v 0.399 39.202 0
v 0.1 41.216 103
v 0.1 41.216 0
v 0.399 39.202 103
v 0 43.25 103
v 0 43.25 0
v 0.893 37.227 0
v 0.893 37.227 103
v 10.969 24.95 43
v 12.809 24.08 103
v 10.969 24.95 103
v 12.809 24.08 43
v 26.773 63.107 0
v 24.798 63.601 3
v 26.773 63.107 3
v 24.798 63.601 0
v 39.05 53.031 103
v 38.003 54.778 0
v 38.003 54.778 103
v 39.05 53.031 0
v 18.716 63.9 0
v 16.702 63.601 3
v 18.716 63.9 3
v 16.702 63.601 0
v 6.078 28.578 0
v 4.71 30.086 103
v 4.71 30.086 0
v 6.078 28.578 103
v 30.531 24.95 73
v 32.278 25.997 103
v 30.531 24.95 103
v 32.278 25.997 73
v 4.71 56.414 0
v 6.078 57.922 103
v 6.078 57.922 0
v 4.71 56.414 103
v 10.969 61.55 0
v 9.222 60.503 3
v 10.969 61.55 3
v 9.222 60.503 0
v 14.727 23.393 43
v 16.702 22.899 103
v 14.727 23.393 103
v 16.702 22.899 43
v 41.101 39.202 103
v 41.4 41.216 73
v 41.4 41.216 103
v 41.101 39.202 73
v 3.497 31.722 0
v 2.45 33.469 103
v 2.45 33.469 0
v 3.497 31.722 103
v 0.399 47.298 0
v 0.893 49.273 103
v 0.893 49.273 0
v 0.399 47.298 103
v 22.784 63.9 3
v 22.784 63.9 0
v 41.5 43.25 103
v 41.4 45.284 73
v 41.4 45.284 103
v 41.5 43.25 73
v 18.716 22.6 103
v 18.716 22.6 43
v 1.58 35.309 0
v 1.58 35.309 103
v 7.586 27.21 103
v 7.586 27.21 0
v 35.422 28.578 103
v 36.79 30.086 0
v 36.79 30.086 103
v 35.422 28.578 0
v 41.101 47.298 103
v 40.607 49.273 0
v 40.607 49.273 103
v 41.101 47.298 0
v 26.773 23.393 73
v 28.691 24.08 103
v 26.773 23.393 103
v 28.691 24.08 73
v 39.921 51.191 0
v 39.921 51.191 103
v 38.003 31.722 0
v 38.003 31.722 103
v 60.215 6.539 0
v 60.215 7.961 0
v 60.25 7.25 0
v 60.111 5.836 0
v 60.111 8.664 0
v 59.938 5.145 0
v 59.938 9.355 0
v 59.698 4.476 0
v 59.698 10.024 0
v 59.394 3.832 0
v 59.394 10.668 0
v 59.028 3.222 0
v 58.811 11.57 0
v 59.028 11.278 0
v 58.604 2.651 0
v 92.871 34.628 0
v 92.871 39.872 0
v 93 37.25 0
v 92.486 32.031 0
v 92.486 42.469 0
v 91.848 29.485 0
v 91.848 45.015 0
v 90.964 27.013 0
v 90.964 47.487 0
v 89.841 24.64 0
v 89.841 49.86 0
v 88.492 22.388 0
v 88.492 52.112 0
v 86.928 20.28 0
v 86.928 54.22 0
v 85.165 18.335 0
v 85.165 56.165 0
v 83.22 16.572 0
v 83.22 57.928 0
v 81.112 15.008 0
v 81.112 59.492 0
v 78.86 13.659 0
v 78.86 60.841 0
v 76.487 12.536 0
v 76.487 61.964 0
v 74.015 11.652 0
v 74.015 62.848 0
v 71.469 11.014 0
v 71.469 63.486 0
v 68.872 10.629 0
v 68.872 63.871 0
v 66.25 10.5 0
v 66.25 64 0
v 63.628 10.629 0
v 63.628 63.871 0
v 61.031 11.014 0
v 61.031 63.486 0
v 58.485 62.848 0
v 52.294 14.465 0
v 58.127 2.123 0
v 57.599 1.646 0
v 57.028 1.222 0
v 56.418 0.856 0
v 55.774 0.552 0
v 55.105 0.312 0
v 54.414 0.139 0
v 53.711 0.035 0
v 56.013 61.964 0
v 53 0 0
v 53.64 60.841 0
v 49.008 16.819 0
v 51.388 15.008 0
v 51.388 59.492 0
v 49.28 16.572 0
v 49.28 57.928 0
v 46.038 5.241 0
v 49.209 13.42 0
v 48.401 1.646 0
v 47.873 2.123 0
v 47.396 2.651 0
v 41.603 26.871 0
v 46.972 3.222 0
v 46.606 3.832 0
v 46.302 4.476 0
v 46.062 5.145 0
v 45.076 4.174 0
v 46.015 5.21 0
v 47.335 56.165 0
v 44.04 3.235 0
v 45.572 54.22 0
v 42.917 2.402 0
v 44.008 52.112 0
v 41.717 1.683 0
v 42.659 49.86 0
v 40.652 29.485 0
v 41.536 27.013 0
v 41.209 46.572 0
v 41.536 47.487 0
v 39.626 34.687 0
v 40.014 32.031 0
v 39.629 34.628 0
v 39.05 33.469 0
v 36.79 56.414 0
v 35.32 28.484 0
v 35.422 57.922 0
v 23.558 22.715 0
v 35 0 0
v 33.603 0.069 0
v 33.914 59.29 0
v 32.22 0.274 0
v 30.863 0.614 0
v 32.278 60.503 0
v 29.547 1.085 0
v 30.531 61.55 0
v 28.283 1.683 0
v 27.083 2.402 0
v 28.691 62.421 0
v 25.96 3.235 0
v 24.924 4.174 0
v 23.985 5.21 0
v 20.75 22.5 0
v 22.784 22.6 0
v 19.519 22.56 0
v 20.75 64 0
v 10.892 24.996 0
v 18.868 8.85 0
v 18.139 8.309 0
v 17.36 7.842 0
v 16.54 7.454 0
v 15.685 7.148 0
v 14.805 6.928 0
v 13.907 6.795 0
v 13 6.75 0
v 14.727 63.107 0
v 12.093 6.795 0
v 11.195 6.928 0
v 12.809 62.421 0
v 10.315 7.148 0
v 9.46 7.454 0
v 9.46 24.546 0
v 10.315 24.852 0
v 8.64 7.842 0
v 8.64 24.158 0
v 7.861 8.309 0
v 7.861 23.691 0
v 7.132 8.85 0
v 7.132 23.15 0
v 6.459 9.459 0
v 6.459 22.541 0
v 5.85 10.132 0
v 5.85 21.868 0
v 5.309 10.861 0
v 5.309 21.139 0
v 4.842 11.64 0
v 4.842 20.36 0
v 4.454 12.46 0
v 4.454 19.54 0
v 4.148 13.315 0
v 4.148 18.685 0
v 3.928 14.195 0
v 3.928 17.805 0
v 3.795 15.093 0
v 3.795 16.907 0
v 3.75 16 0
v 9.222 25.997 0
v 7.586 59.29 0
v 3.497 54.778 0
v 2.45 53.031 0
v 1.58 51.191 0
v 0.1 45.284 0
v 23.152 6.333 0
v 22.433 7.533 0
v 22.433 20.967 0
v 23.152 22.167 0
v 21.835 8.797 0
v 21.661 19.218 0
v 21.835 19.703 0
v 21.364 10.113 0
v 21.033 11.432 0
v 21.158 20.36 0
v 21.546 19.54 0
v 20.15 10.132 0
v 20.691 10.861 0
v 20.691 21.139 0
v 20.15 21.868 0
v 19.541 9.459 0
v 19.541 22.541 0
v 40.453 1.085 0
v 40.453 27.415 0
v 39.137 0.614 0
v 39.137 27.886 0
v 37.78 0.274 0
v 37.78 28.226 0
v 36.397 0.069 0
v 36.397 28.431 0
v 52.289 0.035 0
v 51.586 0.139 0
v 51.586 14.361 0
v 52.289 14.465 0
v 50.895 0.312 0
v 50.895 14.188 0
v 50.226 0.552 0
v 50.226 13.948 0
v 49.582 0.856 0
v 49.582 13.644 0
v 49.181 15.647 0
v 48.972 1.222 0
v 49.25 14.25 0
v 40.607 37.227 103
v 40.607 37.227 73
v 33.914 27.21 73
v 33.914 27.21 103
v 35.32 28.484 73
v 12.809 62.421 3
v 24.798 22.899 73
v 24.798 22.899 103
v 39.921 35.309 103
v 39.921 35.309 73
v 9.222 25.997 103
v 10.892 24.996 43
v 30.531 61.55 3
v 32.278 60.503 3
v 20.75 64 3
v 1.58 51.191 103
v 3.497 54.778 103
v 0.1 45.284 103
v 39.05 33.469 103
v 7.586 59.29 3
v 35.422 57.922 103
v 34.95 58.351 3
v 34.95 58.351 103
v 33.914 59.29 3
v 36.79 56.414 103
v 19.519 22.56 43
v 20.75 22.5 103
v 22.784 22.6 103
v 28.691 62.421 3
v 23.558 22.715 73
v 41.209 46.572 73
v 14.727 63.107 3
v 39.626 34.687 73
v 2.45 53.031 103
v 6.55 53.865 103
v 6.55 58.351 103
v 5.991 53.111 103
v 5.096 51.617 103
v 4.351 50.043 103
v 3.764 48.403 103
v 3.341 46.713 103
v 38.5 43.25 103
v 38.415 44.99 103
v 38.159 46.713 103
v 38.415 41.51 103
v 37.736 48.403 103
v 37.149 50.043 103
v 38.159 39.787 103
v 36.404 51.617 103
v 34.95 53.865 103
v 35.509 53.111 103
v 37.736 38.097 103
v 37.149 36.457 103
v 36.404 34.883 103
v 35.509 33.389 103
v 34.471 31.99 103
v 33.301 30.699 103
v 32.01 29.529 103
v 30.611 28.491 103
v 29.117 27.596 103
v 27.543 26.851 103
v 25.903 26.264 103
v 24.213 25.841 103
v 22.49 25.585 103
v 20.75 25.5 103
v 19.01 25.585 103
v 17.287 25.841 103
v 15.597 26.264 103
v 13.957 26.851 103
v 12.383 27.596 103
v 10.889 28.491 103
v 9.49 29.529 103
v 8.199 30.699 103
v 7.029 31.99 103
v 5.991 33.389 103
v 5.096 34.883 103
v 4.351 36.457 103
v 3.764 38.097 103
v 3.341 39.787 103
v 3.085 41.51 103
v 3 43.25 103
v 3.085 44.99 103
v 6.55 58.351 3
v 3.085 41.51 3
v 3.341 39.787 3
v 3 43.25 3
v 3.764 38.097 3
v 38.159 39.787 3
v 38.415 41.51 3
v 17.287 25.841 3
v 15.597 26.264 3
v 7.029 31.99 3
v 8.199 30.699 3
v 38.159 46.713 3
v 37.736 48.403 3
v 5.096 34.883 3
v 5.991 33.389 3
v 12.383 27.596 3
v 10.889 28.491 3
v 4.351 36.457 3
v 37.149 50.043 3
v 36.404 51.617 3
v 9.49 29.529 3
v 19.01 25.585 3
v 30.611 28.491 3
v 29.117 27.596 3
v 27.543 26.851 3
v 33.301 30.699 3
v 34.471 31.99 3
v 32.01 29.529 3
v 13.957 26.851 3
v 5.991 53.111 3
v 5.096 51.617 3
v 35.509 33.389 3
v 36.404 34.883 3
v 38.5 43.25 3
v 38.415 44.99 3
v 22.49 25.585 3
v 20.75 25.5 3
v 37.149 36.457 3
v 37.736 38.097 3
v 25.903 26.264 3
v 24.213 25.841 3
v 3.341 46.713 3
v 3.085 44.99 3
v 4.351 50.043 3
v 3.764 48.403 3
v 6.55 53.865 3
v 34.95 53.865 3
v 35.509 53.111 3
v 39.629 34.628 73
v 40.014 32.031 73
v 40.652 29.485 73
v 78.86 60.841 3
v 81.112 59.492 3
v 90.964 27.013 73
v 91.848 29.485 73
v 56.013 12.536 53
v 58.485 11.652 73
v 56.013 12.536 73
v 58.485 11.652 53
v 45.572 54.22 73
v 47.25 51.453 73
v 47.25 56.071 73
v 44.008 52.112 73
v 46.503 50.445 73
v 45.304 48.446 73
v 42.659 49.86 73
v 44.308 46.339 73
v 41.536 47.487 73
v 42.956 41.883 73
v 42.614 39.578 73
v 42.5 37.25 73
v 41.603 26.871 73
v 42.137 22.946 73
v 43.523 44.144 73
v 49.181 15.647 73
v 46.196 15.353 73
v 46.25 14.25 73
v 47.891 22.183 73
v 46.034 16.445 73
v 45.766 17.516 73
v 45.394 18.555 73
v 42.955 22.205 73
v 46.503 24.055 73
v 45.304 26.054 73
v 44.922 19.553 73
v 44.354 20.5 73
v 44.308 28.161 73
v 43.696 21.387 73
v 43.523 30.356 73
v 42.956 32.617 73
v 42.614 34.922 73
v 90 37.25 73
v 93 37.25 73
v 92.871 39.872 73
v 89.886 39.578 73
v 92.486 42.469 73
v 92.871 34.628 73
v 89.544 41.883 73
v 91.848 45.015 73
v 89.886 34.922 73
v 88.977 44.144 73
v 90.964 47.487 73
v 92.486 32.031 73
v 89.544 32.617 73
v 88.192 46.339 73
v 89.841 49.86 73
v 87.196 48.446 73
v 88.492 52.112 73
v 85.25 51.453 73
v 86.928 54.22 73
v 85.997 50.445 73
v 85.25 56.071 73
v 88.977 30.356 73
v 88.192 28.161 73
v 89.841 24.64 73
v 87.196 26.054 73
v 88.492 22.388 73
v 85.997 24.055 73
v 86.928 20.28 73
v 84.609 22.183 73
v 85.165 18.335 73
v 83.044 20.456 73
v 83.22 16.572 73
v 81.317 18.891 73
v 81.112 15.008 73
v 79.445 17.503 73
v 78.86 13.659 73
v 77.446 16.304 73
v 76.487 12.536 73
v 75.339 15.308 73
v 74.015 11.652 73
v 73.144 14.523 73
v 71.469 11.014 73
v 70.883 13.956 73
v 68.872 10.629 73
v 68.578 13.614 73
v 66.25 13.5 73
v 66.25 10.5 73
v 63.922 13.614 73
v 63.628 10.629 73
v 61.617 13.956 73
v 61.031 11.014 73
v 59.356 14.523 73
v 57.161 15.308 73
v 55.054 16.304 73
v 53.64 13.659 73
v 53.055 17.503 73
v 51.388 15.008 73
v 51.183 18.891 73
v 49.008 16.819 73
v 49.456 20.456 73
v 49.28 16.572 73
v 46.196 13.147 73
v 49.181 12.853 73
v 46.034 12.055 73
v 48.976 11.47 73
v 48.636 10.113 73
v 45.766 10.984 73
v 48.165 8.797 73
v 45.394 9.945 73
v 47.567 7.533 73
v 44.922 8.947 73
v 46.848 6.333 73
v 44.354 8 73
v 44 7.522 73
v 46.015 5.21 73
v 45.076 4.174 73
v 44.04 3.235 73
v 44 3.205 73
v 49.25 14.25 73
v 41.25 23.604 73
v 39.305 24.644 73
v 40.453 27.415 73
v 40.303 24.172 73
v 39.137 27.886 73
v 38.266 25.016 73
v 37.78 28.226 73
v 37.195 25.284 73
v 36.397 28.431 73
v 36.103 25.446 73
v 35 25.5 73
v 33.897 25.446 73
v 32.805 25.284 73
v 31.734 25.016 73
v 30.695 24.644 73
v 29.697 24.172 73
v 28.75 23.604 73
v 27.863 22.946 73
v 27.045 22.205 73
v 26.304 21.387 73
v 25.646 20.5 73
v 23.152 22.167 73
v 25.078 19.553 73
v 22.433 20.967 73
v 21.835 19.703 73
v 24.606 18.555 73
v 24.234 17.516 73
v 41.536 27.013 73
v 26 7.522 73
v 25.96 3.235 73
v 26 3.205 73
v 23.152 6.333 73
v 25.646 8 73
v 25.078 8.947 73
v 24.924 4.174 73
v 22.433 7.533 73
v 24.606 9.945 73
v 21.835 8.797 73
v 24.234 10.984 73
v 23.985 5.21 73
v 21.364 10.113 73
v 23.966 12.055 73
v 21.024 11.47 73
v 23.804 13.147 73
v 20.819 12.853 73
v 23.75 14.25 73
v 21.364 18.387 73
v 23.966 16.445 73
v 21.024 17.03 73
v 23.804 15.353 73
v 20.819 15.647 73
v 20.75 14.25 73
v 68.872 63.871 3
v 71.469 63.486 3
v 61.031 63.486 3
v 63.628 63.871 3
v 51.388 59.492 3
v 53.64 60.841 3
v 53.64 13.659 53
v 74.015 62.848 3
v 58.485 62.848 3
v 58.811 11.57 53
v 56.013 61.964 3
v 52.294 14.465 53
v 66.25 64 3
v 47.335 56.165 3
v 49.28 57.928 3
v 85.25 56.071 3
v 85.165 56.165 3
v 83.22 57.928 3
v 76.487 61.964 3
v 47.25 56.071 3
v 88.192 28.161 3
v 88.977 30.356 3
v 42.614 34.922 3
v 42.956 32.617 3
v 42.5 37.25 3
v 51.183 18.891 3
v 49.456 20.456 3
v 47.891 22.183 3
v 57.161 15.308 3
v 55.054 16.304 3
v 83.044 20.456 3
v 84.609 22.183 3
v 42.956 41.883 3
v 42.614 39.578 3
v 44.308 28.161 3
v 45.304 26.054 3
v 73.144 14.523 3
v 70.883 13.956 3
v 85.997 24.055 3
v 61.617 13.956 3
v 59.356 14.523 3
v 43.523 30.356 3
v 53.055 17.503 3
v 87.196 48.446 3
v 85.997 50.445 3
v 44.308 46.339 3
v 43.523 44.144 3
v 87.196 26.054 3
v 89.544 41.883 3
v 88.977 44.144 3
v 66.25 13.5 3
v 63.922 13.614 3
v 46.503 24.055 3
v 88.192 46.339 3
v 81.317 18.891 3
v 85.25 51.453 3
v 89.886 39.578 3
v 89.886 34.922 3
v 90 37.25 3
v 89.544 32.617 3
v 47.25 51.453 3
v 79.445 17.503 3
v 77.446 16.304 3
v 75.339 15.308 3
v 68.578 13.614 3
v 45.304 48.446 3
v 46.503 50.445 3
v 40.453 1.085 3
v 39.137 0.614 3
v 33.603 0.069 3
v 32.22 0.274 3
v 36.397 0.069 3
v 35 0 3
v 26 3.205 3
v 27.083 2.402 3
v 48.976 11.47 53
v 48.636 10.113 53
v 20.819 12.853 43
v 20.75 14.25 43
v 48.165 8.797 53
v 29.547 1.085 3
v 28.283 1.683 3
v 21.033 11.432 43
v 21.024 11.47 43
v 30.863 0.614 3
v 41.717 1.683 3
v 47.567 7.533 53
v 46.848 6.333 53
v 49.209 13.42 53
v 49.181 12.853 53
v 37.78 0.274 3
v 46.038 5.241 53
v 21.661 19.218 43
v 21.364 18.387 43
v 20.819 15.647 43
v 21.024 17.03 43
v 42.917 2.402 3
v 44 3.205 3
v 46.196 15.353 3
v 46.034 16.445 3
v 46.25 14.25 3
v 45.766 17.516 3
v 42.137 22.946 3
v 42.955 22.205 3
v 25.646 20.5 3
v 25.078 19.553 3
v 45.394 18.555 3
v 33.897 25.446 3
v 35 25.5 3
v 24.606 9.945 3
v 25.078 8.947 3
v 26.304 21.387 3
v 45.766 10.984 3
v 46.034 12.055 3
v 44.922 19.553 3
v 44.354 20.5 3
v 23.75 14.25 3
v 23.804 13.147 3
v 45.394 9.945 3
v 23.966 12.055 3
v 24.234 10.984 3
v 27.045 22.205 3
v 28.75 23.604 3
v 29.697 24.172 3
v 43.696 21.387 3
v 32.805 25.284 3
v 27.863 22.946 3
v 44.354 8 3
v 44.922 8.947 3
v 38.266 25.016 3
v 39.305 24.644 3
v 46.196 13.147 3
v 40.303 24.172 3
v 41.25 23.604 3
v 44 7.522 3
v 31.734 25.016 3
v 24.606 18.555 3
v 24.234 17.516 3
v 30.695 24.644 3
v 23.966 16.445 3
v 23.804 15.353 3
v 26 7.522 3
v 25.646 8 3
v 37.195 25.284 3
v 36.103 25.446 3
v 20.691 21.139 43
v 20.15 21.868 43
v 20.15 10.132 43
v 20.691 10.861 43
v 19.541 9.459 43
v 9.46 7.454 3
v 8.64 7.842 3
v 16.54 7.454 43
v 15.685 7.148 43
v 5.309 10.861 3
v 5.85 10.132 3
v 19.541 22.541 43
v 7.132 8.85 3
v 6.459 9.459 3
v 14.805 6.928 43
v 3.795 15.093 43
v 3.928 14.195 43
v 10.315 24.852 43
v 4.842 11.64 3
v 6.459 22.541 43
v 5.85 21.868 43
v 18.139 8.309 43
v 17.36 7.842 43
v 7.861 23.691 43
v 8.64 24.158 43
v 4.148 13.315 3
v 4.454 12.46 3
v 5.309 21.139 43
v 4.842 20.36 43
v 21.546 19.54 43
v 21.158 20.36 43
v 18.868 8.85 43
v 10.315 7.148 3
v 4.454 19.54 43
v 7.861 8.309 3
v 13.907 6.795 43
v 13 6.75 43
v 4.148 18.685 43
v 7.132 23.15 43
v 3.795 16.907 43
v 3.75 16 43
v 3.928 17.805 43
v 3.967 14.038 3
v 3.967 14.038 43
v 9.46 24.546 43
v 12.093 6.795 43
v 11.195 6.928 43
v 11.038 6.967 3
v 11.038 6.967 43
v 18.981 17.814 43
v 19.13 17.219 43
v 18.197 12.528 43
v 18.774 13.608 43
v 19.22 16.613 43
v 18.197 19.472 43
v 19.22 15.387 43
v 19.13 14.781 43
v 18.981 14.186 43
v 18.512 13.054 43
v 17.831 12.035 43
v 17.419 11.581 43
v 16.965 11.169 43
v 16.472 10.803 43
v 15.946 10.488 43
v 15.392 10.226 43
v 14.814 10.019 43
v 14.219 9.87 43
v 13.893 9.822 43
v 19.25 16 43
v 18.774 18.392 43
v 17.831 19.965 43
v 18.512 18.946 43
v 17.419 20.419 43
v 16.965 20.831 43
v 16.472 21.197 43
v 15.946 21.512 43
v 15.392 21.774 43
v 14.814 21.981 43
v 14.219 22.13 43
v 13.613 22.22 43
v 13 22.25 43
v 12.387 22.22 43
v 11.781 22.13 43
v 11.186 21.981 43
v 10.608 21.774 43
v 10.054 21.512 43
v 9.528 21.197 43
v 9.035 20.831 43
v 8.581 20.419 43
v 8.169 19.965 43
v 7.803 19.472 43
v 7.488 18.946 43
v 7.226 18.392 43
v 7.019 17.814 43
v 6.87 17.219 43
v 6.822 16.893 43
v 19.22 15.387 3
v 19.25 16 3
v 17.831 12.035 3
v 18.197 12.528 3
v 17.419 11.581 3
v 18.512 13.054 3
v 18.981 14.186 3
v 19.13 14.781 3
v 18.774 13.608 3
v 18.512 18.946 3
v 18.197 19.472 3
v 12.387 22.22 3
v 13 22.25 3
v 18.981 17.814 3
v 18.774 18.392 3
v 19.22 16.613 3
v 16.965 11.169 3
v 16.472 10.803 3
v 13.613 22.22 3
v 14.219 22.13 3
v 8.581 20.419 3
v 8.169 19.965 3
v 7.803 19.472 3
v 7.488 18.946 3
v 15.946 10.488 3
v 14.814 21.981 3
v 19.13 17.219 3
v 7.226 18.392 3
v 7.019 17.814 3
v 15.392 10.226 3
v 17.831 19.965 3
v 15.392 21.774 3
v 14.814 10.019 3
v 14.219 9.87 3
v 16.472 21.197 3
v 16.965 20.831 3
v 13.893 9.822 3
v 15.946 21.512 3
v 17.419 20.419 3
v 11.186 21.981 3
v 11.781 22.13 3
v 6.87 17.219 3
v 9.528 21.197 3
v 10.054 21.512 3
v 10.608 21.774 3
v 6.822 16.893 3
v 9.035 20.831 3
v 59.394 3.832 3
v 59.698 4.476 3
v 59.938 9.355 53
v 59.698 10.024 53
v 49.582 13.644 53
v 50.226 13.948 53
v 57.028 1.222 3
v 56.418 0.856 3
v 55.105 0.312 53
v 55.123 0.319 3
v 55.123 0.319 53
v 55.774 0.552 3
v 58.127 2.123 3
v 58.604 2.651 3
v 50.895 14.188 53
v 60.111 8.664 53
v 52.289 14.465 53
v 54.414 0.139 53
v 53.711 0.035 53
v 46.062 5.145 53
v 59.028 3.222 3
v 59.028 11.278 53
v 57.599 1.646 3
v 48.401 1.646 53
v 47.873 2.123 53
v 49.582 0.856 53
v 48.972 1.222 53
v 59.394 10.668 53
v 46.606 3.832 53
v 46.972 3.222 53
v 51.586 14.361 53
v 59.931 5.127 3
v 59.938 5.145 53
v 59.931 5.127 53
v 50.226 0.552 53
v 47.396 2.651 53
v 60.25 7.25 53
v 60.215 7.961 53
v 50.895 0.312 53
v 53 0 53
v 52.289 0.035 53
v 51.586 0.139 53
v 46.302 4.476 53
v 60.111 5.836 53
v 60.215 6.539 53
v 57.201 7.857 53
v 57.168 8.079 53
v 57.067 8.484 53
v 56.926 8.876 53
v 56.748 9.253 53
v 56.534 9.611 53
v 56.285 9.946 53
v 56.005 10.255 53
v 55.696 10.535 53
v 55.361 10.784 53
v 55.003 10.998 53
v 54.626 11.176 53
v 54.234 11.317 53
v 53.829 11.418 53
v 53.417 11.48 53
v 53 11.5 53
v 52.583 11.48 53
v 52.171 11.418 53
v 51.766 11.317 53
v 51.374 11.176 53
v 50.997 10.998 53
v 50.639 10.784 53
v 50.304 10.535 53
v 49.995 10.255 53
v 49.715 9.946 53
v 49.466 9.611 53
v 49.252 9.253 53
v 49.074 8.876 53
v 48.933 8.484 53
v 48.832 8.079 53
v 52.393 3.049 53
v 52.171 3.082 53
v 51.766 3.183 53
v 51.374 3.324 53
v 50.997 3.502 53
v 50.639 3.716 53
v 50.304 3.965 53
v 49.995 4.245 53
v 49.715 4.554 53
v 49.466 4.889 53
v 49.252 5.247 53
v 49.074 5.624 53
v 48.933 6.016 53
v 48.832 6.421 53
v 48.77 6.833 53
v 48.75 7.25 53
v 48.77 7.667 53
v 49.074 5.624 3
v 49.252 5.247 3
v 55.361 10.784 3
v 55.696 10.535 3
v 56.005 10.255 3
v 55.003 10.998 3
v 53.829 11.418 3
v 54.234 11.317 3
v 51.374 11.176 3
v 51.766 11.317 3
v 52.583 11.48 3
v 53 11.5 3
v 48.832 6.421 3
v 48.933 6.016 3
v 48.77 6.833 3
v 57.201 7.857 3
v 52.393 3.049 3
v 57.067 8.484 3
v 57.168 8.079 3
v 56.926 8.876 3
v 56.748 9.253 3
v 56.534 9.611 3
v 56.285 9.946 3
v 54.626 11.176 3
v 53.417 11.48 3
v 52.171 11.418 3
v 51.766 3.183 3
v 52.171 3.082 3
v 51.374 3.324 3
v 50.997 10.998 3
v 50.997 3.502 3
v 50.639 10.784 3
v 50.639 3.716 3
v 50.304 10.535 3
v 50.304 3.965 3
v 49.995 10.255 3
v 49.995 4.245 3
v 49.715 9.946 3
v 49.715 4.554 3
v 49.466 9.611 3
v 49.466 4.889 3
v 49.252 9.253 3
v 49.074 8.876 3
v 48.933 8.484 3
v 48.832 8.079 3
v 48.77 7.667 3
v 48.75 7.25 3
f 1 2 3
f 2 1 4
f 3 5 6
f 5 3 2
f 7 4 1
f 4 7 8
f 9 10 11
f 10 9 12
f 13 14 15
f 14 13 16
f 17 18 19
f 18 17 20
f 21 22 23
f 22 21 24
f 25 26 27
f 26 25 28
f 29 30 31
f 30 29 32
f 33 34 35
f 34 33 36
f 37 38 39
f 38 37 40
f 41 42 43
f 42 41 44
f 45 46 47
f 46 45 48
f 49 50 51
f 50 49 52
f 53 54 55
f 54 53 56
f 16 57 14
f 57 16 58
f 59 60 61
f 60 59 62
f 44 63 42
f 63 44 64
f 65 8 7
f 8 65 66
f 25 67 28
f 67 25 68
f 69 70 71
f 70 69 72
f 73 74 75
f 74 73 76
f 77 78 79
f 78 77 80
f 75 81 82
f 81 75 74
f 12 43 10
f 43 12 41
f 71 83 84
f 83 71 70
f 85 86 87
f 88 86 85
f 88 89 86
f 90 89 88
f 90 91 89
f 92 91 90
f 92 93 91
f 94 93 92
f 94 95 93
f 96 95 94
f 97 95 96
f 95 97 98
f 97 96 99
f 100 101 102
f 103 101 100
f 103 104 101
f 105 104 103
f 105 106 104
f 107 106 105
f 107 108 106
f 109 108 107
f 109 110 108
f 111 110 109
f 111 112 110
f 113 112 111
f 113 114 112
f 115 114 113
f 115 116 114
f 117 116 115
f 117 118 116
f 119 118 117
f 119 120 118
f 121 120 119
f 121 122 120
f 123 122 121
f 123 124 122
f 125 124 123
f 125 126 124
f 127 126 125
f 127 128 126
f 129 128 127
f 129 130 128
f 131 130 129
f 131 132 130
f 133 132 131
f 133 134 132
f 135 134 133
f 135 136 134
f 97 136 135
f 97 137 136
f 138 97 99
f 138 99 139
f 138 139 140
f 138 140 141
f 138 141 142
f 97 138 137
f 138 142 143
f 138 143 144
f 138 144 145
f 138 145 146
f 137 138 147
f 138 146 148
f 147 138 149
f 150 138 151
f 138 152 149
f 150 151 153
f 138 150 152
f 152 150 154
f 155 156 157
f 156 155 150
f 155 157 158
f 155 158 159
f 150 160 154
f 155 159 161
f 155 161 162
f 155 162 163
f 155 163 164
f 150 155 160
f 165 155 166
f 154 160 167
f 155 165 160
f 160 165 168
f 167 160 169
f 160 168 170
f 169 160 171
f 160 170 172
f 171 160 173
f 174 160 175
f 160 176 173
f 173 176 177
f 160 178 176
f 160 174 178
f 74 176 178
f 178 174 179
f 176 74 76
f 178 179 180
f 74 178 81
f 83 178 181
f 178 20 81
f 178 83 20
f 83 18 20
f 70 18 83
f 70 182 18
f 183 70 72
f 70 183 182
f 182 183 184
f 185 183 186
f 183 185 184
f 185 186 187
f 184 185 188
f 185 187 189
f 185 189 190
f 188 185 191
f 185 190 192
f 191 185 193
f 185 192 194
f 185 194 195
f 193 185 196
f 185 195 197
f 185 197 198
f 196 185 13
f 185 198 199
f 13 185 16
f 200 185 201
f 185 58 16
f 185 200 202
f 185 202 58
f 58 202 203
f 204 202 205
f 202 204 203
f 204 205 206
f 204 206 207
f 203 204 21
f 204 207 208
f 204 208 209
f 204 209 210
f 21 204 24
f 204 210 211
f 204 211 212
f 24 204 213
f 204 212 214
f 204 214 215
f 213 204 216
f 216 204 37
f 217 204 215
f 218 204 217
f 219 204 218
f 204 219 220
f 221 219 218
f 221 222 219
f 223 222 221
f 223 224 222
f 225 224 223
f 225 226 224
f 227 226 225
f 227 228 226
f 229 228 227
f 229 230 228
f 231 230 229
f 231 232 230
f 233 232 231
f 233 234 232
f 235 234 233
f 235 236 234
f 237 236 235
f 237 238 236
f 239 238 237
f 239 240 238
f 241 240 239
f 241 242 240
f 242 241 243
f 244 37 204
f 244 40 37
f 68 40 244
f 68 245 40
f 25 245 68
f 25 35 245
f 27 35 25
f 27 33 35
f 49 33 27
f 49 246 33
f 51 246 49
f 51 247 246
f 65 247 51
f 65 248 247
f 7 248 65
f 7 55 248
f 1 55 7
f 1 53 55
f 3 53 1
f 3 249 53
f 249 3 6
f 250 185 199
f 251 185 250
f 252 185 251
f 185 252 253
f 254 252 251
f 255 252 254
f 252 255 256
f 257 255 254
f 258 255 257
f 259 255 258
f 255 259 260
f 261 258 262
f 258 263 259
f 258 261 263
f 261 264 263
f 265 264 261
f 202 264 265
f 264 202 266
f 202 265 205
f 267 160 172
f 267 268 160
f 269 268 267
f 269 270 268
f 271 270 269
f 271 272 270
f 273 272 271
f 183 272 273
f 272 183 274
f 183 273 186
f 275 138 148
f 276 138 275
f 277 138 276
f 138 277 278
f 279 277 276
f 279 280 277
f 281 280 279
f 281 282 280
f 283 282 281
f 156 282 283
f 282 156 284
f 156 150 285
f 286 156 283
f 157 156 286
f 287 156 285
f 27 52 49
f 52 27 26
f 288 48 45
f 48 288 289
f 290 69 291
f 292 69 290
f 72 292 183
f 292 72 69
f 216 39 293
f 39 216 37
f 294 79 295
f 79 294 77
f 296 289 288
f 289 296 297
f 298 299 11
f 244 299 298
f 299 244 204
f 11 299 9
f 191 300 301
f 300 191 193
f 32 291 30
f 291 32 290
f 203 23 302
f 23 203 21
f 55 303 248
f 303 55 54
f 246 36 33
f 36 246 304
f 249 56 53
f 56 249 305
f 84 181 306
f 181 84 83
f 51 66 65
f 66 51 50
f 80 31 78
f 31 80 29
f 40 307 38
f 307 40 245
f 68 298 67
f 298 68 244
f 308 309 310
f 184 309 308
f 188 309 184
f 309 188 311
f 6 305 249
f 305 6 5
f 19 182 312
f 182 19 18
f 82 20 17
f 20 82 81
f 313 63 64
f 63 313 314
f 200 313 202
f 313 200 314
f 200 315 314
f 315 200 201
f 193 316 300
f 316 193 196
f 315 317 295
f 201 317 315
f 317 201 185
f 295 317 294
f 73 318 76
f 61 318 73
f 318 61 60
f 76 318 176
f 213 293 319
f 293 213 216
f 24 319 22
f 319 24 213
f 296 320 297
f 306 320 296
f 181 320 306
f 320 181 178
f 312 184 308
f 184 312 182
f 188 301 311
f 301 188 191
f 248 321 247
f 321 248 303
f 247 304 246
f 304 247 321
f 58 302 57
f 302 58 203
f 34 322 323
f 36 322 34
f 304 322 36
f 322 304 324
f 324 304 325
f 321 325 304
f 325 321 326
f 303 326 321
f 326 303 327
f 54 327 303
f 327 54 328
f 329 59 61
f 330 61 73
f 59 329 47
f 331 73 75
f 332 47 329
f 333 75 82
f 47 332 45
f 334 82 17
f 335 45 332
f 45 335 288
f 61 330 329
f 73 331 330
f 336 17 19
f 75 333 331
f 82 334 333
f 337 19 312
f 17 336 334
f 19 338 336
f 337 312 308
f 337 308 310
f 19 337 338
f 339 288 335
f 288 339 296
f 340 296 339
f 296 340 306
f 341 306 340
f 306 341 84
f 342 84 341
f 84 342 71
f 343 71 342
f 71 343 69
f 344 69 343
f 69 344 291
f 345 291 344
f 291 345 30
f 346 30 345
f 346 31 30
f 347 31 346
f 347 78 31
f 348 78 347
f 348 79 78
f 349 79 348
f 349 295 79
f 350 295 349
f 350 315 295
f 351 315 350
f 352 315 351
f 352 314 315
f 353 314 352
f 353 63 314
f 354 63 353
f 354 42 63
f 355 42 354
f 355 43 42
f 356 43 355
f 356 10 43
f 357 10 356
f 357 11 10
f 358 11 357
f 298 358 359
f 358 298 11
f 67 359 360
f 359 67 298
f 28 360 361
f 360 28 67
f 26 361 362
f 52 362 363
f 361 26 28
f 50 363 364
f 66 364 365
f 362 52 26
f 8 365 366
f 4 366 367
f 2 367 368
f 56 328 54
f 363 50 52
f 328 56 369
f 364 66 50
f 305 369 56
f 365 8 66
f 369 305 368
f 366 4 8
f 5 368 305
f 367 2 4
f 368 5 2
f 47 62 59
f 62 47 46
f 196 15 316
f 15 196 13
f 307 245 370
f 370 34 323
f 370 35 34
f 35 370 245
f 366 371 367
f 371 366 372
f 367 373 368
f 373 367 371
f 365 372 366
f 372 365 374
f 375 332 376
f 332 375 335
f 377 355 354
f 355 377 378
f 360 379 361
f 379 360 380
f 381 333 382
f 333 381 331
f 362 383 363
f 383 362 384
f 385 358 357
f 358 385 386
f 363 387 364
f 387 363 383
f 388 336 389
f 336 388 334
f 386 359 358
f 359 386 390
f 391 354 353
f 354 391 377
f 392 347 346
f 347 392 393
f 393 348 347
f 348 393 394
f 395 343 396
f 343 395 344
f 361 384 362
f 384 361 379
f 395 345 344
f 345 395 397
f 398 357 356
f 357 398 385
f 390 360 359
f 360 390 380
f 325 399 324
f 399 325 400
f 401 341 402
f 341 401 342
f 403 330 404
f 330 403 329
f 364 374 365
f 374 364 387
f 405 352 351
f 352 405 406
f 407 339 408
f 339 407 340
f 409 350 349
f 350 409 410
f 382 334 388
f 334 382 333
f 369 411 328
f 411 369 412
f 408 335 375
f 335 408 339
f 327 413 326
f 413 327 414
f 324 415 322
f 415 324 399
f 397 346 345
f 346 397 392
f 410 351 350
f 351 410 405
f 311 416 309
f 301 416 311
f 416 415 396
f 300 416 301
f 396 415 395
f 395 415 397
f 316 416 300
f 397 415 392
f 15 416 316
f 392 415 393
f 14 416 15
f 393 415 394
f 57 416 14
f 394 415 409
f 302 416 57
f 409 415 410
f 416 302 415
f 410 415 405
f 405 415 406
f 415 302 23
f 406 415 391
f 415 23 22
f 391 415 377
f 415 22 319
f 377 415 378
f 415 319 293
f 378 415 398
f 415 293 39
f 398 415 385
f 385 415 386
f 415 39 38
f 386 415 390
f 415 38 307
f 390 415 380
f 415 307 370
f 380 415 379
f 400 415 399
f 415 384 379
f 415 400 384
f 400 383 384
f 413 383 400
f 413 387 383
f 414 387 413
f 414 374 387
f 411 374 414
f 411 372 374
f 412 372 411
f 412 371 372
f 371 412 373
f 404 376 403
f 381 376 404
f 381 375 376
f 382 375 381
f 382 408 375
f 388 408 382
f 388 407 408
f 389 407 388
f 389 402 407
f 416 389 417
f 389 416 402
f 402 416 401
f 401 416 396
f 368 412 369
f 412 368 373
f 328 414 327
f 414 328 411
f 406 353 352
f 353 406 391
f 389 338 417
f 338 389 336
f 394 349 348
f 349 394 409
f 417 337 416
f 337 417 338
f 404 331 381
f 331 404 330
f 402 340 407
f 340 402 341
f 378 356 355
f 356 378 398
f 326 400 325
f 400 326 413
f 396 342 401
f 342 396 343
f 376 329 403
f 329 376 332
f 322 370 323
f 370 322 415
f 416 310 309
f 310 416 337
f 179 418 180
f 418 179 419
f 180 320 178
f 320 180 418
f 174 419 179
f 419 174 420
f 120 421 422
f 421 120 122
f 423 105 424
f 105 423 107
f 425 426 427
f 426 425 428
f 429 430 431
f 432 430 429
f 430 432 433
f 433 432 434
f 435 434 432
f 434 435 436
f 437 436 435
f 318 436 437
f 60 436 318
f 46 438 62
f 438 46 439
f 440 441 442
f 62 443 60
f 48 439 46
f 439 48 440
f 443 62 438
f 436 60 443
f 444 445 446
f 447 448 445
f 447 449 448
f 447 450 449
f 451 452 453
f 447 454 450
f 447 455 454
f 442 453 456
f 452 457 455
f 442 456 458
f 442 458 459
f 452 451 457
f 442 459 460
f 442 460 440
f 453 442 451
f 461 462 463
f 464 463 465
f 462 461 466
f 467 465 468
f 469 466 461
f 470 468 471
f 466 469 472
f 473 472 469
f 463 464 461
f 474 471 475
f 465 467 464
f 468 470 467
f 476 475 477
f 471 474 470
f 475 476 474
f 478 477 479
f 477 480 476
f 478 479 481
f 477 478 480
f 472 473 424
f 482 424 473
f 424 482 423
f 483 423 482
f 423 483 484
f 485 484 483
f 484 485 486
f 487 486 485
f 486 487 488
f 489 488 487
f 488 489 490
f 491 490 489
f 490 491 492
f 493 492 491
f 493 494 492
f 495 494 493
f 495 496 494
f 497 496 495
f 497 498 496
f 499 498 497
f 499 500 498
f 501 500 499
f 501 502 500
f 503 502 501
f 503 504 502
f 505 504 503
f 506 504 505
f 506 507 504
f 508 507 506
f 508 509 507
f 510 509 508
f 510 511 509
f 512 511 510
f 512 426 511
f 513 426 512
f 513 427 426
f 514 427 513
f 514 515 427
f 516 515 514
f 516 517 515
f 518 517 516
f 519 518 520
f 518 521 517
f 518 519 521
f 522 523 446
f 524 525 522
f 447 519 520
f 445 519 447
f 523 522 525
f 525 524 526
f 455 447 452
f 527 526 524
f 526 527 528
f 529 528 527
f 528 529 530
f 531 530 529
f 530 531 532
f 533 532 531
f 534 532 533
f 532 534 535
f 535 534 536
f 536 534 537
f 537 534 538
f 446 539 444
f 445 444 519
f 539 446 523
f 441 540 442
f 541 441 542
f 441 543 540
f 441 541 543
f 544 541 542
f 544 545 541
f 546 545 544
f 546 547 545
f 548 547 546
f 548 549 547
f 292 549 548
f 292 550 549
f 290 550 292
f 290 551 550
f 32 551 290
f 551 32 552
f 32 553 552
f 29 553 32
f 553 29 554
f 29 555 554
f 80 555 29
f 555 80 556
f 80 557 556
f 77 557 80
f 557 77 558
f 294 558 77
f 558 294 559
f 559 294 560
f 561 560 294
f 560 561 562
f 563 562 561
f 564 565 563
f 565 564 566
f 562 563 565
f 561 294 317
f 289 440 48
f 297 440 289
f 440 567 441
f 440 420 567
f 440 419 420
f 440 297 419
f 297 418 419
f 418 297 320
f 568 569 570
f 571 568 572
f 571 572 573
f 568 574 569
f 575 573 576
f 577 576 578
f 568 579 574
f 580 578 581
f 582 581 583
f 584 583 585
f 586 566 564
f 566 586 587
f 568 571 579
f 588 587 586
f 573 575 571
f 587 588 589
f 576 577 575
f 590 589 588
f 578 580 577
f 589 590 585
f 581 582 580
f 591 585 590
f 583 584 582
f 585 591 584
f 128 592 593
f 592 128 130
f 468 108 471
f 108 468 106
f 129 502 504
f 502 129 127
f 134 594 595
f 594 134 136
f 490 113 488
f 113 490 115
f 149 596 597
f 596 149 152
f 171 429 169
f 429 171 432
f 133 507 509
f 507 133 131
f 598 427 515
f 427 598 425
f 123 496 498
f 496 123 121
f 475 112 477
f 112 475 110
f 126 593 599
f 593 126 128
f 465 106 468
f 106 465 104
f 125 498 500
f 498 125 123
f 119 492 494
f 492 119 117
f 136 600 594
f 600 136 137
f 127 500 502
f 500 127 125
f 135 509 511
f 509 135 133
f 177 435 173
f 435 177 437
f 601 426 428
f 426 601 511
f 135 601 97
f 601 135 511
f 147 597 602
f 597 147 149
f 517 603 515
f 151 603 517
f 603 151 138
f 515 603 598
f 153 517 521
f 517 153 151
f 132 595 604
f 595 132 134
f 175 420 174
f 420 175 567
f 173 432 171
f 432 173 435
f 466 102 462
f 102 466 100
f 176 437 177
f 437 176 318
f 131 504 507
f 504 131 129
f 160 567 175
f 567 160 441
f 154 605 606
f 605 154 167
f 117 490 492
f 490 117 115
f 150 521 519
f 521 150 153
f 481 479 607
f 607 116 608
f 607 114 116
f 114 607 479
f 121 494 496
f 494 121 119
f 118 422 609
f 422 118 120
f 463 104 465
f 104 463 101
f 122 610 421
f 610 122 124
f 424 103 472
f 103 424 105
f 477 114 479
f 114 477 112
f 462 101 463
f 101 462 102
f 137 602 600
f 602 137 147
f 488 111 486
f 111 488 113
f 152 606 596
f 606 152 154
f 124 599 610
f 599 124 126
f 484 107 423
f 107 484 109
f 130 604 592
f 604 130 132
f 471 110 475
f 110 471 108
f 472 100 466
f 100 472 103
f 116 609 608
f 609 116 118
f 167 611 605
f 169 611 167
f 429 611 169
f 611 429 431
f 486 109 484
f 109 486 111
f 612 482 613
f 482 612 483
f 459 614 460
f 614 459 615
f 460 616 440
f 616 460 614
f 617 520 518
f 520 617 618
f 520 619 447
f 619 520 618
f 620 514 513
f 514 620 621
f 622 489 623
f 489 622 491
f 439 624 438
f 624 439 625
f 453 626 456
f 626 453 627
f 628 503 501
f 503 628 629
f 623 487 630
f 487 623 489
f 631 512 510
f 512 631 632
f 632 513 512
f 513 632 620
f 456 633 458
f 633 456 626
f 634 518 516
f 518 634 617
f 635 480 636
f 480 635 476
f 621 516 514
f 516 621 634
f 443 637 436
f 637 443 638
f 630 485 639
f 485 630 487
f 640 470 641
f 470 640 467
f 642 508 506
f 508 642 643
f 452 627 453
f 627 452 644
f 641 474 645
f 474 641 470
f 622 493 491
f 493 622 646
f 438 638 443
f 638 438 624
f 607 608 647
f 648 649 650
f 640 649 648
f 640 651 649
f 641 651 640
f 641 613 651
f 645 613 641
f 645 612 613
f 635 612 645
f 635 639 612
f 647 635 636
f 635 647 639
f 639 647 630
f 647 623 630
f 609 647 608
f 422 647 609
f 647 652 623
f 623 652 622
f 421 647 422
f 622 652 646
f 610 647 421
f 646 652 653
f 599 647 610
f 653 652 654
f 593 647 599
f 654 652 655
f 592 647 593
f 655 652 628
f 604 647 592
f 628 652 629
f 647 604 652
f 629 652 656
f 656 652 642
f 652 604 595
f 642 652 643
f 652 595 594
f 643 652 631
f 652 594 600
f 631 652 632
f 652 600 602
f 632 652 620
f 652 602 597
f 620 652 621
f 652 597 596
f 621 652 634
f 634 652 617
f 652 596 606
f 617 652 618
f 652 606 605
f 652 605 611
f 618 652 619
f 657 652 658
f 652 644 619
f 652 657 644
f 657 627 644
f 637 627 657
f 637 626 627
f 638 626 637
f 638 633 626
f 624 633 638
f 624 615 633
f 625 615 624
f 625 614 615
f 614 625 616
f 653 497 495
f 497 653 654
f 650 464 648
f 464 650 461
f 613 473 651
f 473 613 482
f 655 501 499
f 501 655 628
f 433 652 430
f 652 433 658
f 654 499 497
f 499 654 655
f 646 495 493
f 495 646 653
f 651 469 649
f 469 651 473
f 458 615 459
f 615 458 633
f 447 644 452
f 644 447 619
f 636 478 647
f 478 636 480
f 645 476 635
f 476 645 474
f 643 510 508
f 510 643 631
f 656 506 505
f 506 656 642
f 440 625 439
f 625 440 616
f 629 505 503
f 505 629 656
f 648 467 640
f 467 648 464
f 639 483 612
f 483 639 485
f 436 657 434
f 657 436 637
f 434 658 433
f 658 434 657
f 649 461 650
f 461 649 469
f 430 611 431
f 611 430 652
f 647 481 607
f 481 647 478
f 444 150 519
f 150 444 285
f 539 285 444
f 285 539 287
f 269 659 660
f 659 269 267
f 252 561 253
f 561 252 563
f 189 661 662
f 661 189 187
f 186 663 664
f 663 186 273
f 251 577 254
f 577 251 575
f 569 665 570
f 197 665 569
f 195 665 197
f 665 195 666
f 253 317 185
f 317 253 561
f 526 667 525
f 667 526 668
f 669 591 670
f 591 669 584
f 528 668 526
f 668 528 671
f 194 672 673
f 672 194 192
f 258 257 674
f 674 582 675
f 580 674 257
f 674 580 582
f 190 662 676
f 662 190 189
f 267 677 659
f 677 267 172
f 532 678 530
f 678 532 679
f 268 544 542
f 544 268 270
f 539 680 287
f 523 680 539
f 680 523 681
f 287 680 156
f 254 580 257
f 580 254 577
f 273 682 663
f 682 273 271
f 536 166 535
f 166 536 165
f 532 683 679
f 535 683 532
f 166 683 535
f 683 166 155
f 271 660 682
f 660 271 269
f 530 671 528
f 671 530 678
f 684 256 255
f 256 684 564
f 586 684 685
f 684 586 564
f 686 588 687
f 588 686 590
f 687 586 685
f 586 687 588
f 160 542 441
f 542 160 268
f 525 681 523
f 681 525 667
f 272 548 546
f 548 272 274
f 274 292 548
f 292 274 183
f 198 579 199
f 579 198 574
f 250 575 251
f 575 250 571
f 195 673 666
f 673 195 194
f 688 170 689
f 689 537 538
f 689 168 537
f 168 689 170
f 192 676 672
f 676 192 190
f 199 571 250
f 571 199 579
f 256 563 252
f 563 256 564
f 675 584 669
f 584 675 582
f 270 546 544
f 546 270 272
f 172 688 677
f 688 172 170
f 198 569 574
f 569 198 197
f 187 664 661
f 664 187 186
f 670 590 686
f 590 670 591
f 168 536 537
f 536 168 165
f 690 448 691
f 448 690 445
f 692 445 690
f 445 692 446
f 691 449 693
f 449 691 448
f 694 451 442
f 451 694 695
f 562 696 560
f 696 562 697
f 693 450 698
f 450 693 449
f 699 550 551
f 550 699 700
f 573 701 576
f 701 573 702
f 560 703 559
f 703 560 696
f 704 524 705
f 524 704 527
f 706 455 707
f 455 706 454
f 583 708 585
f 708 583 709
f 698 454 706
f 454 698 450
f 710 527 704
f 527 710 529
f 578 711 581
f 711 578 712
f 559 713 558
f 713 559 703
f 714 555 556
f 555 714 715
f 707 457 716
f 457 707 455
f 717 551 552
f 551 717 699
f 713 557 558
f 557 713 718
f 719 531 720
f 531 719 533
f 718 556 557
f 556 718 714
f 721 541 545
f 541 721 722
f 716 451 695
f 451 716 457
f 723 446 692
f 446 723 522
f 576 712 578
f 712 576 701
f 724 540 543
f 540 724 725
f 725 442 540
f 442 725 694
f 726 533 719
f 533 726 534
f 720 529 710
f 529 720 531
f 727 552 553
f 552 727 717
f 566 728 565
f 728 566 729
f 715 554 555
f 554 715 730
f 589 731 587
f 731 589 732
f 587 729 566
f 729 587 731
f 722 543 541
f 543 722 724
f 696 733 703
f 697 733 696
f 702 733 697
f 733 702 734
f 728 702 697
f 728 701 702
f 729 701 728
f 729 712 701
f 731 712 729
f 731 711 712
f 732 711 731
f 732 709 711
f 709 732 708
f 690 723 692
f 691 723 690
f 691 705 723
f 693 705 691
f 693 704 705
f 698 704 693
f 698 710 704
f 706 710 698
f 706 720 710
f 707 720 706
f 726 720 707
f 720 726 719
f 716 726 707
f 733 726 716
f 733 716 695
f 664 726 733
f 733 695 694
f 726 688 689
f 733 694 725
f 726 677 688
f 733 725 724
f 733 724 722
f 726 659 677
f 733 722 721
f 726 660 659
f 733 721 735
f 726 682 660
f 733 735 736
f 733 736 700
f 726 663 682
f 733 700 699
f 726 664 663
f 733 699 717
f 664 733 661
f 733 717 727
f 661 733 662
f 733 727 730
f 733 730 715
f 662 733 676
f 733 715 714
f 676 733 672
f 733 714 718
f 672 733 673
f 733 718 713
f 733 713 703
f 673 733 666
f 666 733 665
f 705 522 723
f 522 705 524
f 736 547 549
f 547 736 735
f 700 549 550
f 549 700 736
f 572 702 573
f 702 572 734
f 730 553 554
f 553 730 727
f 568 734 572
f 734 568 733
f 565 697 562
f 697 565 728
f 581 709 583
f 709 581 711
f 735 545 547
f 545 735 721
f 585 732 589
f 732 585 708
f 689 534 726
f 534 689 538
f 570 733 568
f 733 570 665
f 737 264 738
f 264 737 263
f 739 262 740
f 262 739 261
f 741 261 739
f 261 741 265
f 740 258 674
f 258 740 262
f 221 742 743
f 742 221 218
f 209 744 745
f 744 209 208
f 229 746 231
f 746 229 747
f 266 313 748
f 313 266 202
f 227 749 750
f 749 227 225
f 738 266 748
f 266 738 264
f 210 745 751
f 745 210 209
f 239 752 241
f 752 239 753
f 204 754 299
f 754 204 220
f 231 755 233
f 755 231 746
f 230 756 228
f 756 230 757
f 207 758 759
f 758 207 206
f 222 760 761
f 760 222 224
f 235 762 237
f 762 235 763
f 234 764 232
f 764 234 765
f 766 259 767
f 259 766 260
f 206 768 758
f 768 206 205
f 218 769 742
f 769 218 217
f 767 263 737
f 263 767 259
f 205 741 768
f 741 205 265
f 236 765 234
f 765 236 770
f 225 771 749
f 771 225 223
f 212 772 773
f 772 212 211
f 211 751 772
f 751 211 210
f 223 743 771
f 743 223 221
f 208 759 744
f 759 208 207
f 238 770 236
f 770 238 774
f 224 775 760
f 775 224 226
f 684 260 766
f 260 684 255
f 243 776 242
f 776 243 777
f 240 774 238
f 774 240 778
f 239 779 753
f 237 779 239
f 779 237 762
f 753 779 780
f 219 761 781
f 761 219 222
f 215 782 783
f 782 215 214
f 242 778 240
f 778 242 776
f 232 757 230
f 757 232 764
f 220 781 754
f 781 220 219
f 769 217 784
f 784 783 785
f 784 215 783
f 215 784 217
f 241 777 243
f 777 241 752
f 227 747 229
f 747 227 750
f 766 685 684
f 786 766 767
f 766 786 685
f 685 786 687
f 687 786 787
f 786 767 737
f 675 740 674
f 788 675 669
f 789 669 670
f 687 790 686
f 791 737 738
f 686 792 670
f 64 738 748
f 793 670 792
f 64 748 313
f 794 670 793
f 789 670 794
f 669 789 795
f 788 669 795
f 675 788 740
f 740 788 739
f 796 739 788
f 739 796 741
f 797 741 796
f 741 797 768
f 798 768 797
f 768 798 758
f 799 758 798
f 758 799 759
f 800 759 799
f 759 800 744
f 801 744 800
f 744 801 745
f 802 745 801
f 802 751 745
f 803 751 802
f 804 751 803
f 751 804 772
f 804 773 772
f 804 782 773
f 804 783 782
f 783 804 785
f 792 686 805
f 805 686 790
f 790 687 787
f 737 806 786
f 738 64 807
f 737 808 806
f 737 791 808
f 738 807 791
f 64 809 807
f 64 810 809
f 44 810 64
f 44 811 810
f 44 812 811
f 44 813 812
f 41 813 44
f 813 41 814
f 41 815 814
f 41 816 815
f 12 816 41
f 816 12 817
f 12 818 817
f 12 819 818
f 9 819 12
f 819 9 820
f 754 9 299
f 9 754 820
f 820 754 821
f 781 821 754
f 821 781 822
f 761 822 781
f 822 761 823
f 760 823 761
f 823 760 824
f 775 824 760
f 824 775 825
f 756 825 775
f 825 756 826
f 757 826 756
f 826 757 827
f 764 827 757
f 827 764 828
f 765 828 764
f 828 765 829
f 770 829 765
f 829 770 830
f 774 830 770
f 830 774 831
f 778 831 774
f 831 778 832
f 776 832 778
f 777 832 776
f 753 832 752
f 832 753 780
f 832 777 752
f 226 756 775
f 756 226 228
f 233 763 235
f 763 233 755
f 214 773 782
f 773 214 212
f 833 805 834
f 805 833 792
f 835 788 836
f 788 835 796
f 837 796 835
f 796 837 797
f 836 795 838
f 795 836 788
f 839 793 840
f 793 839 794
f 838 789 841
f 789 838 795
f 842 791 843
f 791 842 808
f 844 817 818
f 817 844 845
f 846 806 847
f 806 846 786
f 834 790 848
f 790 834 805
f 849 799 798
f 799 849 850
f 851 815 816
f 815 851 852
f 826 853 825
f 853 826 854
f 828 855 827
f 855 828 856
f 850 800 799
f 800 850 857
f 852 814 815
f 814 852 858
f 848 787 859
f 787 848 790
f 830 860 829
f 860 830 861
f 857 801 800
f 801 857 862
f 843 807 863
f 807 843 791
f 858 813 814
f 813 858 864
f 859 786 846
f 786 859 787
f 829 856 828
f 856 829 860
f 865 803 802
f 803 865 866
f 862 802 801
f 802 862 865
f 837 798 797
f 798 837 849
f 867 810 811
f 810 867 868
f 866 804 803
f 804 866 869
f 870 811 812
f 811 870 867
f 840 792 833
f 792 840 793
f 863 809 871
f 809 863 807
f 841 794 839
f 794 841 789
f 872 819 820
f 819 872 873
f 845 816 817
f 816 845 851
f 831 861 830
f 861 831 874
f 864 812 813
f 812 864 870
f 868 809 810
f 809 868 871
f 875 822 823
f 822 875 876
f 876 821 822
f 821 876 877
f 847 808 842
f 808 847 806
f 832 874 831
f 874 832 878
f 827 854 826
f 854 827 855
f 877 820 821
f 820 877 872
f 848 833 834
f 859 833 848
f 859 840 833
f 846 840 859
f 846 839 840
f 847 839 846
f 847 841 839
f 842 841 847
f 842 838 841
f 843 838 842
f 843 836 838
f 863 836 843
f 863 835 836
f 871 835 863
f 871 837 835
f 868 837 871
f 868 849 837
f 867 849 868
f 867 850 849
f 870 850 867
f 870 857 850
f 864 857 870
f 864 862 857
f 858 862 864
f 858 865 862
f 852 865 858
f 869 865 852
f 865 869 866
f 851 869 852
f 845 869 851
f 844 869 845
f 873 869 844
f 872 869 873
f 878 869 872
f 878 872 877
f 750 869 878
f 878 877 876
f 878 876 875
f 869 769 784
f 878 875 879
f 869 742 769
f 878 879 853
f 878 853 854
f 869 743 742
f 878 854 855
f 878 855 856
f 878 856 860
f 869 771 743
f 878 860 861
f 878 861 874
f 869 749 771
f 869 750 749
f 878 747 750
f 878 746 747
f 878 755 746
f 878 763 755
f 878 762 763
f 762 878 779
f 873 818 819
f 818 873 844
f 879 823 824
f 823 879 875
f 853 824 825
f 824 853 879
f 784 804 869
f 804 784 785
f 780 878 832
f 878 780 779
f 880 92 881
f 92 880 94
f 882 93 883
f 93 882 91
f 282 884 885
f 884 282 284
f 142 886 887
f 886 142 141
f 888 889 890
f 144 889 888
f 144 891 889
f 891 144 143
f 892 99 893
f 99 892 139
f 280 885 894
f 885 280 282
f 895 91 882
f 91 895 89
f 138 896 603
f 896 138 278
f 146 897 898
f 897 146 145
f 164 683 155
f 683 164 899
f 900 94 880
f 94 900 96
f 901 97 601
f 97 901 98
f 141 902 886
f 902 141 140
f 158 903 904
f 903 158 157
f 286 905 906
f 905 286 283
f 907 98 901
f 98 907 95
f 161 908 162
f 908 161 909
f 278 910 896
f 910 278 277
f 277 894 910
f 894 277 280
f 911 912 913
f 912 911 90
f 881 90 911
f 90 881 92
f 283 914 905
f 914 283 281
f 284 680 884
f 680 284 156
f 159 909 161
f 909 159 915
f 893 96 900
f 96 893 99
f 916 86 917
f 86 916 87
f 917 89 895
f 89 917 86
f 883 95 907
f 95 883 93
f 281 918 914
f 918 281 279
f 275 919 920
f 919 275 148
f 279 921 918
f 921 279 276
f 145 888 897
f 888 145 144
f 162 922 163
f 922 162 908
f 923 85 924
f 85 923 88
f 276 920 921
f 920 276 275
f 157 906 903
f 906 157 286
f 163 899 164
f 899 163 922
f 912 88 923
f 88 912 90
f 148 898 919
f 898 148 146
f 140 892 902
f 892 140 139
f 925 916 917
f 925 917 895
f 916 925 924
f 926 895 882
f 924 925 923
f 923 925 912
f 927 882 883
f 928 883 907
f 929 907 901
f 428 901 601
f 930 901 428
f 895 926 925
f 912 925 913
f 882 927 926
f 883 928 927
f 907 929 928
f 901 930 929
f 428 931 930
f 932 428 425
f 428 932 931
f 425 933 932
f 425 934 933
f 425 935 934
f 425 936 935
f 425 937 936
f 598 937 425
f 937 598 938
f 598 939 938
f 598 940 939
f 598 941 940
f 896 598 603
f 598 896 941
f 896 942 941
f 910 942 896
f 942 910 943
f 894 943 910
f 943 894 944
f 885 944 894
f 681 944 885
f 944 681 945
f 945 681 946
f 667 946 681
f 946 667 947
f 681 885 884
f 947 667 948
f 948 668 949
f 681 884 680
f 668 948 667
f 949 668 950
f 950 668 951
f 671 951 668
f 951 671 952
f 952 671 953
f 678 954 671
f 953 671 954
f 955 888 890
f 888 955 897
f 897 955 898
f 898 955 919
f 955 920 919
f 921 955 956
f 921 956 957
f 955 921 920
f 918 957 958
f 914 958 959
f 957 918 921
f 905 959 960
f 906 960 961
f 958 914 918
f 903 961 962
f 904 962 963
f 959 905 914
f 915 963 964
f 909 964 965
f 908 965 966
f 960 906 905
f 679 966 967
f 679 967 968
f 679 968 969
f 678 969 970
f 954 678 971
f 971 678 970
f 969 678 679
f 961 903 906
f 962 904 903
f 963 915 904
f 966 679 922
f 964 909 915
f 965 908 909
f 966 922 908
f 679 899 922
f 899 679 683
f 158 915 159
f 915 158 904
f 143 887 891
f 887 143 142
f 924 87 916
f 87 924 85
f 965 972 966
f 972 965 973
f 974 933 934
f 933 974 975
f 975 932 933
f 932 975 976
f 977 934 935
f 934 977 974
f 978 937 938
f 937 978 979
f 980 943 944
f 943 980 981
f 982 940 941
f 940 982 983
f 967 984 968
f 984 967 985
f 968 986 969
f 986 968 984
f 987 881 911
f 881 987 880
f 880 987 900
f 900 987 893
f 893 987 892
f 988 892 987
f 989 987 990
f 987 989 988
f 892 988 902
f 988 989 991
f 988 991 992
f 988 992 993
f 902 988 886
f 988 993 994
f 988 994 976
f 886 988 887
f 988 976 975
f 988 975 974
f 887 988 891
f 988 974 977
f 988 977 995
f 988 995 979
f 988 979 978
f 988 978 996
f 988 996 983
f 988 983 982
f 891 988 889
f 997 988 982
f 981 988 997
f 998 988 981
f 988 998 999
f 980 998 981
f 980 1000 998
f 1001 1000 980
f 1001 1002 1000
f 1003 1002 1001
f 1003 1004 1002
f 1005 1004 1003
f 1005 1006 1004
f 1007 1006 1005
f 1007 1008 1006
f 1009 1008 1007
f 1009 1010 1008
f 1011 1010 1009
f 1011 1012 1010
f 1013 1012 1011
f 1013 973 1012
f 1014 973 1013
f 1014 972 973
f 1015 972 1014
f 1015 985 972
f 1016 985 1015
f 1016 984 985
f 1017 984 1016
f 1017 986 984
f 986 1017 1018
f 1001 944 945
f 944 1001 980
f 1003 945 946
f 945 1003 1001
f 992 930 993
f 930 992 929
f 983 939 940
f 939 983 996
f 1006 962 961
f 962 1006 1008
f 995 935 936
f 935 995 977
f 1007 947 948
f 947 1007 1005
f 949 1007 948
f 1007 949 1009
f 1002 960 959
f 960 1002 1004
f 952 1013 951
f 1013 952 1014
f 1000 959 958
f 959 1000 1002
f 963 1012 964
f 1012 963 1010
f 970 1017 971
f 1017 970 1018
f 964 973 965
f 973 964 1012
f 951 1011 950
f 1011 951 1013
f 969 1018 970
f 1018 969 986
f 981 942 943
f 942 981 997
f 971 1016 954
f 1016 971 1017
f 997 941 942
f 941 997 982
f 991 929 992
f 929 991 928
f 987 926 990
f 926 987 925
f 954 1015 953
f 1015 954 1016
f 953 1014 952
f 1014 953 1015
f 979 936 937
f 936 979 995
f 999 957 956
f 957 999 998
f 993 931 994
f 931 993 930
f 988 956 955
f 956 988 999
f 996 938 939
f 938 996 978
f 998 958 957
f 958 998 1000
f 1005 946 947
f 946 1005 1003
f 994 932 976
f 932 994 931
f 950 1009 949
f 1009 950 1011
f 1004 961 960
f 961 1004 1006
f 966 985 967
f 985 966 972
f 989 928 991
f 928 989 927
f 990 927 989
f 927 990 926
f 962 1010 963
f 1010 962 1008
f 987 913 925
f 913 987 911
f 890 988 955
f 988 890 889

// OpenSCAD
$fn = 64;


shell_t = 3;


tx = 93;
ty = 64;

// 6003ZZ x 10
translate([35.5/2+shell_t,ty-35.5/2-shell_t,0])
    rotate(180)
    bearing_cylinder(35,10,10);
    
// 6204Z x 5
translate([tx-47.5/2-shell_t,ty-47.5/2-shell_t,0])
    rotate(180)
    bearing_cylinder(47, 14, 5);

//color("gray")
//    cube([tx,ty,shell_t]);

// 608ZZ x 10
translate([35,22.5/2+shell_t,0])
bearing_cylinder(22, 7, 10);
// MR126-ZZ x 10
translate([13,16,0])
rotate(-45)
bearing_cylinder(12, 4, 10);
// MR85-ZZ x 20
translate([53,8.5/2+shell_t,0])
rotate(45)
bearing_cylinder(8, 2.5, 20);

module bearing_cylinder(b_od, b_h, n) {
    // 0.5mm for a loose fit
    b_od2 = b_od + .5;

    difference() {
        // height: bearings + shell
        // width: bearing + 2 shell widths
        cylinder(h=b_h*n + shell_t,
                d=b_od2+2*shell_t);
        
        // inner space
        translate([0,0,shell_t])
        cylinder(h=b_h*n,
                d=b_od2);
        
        // opening
        translate([-b_od2*.8/2,-b_od2/2-shell_t,shell_t])
        cube([b_od2*.8,
              b_od2/2+shell_t,
              b_h*n]);
    }
}
